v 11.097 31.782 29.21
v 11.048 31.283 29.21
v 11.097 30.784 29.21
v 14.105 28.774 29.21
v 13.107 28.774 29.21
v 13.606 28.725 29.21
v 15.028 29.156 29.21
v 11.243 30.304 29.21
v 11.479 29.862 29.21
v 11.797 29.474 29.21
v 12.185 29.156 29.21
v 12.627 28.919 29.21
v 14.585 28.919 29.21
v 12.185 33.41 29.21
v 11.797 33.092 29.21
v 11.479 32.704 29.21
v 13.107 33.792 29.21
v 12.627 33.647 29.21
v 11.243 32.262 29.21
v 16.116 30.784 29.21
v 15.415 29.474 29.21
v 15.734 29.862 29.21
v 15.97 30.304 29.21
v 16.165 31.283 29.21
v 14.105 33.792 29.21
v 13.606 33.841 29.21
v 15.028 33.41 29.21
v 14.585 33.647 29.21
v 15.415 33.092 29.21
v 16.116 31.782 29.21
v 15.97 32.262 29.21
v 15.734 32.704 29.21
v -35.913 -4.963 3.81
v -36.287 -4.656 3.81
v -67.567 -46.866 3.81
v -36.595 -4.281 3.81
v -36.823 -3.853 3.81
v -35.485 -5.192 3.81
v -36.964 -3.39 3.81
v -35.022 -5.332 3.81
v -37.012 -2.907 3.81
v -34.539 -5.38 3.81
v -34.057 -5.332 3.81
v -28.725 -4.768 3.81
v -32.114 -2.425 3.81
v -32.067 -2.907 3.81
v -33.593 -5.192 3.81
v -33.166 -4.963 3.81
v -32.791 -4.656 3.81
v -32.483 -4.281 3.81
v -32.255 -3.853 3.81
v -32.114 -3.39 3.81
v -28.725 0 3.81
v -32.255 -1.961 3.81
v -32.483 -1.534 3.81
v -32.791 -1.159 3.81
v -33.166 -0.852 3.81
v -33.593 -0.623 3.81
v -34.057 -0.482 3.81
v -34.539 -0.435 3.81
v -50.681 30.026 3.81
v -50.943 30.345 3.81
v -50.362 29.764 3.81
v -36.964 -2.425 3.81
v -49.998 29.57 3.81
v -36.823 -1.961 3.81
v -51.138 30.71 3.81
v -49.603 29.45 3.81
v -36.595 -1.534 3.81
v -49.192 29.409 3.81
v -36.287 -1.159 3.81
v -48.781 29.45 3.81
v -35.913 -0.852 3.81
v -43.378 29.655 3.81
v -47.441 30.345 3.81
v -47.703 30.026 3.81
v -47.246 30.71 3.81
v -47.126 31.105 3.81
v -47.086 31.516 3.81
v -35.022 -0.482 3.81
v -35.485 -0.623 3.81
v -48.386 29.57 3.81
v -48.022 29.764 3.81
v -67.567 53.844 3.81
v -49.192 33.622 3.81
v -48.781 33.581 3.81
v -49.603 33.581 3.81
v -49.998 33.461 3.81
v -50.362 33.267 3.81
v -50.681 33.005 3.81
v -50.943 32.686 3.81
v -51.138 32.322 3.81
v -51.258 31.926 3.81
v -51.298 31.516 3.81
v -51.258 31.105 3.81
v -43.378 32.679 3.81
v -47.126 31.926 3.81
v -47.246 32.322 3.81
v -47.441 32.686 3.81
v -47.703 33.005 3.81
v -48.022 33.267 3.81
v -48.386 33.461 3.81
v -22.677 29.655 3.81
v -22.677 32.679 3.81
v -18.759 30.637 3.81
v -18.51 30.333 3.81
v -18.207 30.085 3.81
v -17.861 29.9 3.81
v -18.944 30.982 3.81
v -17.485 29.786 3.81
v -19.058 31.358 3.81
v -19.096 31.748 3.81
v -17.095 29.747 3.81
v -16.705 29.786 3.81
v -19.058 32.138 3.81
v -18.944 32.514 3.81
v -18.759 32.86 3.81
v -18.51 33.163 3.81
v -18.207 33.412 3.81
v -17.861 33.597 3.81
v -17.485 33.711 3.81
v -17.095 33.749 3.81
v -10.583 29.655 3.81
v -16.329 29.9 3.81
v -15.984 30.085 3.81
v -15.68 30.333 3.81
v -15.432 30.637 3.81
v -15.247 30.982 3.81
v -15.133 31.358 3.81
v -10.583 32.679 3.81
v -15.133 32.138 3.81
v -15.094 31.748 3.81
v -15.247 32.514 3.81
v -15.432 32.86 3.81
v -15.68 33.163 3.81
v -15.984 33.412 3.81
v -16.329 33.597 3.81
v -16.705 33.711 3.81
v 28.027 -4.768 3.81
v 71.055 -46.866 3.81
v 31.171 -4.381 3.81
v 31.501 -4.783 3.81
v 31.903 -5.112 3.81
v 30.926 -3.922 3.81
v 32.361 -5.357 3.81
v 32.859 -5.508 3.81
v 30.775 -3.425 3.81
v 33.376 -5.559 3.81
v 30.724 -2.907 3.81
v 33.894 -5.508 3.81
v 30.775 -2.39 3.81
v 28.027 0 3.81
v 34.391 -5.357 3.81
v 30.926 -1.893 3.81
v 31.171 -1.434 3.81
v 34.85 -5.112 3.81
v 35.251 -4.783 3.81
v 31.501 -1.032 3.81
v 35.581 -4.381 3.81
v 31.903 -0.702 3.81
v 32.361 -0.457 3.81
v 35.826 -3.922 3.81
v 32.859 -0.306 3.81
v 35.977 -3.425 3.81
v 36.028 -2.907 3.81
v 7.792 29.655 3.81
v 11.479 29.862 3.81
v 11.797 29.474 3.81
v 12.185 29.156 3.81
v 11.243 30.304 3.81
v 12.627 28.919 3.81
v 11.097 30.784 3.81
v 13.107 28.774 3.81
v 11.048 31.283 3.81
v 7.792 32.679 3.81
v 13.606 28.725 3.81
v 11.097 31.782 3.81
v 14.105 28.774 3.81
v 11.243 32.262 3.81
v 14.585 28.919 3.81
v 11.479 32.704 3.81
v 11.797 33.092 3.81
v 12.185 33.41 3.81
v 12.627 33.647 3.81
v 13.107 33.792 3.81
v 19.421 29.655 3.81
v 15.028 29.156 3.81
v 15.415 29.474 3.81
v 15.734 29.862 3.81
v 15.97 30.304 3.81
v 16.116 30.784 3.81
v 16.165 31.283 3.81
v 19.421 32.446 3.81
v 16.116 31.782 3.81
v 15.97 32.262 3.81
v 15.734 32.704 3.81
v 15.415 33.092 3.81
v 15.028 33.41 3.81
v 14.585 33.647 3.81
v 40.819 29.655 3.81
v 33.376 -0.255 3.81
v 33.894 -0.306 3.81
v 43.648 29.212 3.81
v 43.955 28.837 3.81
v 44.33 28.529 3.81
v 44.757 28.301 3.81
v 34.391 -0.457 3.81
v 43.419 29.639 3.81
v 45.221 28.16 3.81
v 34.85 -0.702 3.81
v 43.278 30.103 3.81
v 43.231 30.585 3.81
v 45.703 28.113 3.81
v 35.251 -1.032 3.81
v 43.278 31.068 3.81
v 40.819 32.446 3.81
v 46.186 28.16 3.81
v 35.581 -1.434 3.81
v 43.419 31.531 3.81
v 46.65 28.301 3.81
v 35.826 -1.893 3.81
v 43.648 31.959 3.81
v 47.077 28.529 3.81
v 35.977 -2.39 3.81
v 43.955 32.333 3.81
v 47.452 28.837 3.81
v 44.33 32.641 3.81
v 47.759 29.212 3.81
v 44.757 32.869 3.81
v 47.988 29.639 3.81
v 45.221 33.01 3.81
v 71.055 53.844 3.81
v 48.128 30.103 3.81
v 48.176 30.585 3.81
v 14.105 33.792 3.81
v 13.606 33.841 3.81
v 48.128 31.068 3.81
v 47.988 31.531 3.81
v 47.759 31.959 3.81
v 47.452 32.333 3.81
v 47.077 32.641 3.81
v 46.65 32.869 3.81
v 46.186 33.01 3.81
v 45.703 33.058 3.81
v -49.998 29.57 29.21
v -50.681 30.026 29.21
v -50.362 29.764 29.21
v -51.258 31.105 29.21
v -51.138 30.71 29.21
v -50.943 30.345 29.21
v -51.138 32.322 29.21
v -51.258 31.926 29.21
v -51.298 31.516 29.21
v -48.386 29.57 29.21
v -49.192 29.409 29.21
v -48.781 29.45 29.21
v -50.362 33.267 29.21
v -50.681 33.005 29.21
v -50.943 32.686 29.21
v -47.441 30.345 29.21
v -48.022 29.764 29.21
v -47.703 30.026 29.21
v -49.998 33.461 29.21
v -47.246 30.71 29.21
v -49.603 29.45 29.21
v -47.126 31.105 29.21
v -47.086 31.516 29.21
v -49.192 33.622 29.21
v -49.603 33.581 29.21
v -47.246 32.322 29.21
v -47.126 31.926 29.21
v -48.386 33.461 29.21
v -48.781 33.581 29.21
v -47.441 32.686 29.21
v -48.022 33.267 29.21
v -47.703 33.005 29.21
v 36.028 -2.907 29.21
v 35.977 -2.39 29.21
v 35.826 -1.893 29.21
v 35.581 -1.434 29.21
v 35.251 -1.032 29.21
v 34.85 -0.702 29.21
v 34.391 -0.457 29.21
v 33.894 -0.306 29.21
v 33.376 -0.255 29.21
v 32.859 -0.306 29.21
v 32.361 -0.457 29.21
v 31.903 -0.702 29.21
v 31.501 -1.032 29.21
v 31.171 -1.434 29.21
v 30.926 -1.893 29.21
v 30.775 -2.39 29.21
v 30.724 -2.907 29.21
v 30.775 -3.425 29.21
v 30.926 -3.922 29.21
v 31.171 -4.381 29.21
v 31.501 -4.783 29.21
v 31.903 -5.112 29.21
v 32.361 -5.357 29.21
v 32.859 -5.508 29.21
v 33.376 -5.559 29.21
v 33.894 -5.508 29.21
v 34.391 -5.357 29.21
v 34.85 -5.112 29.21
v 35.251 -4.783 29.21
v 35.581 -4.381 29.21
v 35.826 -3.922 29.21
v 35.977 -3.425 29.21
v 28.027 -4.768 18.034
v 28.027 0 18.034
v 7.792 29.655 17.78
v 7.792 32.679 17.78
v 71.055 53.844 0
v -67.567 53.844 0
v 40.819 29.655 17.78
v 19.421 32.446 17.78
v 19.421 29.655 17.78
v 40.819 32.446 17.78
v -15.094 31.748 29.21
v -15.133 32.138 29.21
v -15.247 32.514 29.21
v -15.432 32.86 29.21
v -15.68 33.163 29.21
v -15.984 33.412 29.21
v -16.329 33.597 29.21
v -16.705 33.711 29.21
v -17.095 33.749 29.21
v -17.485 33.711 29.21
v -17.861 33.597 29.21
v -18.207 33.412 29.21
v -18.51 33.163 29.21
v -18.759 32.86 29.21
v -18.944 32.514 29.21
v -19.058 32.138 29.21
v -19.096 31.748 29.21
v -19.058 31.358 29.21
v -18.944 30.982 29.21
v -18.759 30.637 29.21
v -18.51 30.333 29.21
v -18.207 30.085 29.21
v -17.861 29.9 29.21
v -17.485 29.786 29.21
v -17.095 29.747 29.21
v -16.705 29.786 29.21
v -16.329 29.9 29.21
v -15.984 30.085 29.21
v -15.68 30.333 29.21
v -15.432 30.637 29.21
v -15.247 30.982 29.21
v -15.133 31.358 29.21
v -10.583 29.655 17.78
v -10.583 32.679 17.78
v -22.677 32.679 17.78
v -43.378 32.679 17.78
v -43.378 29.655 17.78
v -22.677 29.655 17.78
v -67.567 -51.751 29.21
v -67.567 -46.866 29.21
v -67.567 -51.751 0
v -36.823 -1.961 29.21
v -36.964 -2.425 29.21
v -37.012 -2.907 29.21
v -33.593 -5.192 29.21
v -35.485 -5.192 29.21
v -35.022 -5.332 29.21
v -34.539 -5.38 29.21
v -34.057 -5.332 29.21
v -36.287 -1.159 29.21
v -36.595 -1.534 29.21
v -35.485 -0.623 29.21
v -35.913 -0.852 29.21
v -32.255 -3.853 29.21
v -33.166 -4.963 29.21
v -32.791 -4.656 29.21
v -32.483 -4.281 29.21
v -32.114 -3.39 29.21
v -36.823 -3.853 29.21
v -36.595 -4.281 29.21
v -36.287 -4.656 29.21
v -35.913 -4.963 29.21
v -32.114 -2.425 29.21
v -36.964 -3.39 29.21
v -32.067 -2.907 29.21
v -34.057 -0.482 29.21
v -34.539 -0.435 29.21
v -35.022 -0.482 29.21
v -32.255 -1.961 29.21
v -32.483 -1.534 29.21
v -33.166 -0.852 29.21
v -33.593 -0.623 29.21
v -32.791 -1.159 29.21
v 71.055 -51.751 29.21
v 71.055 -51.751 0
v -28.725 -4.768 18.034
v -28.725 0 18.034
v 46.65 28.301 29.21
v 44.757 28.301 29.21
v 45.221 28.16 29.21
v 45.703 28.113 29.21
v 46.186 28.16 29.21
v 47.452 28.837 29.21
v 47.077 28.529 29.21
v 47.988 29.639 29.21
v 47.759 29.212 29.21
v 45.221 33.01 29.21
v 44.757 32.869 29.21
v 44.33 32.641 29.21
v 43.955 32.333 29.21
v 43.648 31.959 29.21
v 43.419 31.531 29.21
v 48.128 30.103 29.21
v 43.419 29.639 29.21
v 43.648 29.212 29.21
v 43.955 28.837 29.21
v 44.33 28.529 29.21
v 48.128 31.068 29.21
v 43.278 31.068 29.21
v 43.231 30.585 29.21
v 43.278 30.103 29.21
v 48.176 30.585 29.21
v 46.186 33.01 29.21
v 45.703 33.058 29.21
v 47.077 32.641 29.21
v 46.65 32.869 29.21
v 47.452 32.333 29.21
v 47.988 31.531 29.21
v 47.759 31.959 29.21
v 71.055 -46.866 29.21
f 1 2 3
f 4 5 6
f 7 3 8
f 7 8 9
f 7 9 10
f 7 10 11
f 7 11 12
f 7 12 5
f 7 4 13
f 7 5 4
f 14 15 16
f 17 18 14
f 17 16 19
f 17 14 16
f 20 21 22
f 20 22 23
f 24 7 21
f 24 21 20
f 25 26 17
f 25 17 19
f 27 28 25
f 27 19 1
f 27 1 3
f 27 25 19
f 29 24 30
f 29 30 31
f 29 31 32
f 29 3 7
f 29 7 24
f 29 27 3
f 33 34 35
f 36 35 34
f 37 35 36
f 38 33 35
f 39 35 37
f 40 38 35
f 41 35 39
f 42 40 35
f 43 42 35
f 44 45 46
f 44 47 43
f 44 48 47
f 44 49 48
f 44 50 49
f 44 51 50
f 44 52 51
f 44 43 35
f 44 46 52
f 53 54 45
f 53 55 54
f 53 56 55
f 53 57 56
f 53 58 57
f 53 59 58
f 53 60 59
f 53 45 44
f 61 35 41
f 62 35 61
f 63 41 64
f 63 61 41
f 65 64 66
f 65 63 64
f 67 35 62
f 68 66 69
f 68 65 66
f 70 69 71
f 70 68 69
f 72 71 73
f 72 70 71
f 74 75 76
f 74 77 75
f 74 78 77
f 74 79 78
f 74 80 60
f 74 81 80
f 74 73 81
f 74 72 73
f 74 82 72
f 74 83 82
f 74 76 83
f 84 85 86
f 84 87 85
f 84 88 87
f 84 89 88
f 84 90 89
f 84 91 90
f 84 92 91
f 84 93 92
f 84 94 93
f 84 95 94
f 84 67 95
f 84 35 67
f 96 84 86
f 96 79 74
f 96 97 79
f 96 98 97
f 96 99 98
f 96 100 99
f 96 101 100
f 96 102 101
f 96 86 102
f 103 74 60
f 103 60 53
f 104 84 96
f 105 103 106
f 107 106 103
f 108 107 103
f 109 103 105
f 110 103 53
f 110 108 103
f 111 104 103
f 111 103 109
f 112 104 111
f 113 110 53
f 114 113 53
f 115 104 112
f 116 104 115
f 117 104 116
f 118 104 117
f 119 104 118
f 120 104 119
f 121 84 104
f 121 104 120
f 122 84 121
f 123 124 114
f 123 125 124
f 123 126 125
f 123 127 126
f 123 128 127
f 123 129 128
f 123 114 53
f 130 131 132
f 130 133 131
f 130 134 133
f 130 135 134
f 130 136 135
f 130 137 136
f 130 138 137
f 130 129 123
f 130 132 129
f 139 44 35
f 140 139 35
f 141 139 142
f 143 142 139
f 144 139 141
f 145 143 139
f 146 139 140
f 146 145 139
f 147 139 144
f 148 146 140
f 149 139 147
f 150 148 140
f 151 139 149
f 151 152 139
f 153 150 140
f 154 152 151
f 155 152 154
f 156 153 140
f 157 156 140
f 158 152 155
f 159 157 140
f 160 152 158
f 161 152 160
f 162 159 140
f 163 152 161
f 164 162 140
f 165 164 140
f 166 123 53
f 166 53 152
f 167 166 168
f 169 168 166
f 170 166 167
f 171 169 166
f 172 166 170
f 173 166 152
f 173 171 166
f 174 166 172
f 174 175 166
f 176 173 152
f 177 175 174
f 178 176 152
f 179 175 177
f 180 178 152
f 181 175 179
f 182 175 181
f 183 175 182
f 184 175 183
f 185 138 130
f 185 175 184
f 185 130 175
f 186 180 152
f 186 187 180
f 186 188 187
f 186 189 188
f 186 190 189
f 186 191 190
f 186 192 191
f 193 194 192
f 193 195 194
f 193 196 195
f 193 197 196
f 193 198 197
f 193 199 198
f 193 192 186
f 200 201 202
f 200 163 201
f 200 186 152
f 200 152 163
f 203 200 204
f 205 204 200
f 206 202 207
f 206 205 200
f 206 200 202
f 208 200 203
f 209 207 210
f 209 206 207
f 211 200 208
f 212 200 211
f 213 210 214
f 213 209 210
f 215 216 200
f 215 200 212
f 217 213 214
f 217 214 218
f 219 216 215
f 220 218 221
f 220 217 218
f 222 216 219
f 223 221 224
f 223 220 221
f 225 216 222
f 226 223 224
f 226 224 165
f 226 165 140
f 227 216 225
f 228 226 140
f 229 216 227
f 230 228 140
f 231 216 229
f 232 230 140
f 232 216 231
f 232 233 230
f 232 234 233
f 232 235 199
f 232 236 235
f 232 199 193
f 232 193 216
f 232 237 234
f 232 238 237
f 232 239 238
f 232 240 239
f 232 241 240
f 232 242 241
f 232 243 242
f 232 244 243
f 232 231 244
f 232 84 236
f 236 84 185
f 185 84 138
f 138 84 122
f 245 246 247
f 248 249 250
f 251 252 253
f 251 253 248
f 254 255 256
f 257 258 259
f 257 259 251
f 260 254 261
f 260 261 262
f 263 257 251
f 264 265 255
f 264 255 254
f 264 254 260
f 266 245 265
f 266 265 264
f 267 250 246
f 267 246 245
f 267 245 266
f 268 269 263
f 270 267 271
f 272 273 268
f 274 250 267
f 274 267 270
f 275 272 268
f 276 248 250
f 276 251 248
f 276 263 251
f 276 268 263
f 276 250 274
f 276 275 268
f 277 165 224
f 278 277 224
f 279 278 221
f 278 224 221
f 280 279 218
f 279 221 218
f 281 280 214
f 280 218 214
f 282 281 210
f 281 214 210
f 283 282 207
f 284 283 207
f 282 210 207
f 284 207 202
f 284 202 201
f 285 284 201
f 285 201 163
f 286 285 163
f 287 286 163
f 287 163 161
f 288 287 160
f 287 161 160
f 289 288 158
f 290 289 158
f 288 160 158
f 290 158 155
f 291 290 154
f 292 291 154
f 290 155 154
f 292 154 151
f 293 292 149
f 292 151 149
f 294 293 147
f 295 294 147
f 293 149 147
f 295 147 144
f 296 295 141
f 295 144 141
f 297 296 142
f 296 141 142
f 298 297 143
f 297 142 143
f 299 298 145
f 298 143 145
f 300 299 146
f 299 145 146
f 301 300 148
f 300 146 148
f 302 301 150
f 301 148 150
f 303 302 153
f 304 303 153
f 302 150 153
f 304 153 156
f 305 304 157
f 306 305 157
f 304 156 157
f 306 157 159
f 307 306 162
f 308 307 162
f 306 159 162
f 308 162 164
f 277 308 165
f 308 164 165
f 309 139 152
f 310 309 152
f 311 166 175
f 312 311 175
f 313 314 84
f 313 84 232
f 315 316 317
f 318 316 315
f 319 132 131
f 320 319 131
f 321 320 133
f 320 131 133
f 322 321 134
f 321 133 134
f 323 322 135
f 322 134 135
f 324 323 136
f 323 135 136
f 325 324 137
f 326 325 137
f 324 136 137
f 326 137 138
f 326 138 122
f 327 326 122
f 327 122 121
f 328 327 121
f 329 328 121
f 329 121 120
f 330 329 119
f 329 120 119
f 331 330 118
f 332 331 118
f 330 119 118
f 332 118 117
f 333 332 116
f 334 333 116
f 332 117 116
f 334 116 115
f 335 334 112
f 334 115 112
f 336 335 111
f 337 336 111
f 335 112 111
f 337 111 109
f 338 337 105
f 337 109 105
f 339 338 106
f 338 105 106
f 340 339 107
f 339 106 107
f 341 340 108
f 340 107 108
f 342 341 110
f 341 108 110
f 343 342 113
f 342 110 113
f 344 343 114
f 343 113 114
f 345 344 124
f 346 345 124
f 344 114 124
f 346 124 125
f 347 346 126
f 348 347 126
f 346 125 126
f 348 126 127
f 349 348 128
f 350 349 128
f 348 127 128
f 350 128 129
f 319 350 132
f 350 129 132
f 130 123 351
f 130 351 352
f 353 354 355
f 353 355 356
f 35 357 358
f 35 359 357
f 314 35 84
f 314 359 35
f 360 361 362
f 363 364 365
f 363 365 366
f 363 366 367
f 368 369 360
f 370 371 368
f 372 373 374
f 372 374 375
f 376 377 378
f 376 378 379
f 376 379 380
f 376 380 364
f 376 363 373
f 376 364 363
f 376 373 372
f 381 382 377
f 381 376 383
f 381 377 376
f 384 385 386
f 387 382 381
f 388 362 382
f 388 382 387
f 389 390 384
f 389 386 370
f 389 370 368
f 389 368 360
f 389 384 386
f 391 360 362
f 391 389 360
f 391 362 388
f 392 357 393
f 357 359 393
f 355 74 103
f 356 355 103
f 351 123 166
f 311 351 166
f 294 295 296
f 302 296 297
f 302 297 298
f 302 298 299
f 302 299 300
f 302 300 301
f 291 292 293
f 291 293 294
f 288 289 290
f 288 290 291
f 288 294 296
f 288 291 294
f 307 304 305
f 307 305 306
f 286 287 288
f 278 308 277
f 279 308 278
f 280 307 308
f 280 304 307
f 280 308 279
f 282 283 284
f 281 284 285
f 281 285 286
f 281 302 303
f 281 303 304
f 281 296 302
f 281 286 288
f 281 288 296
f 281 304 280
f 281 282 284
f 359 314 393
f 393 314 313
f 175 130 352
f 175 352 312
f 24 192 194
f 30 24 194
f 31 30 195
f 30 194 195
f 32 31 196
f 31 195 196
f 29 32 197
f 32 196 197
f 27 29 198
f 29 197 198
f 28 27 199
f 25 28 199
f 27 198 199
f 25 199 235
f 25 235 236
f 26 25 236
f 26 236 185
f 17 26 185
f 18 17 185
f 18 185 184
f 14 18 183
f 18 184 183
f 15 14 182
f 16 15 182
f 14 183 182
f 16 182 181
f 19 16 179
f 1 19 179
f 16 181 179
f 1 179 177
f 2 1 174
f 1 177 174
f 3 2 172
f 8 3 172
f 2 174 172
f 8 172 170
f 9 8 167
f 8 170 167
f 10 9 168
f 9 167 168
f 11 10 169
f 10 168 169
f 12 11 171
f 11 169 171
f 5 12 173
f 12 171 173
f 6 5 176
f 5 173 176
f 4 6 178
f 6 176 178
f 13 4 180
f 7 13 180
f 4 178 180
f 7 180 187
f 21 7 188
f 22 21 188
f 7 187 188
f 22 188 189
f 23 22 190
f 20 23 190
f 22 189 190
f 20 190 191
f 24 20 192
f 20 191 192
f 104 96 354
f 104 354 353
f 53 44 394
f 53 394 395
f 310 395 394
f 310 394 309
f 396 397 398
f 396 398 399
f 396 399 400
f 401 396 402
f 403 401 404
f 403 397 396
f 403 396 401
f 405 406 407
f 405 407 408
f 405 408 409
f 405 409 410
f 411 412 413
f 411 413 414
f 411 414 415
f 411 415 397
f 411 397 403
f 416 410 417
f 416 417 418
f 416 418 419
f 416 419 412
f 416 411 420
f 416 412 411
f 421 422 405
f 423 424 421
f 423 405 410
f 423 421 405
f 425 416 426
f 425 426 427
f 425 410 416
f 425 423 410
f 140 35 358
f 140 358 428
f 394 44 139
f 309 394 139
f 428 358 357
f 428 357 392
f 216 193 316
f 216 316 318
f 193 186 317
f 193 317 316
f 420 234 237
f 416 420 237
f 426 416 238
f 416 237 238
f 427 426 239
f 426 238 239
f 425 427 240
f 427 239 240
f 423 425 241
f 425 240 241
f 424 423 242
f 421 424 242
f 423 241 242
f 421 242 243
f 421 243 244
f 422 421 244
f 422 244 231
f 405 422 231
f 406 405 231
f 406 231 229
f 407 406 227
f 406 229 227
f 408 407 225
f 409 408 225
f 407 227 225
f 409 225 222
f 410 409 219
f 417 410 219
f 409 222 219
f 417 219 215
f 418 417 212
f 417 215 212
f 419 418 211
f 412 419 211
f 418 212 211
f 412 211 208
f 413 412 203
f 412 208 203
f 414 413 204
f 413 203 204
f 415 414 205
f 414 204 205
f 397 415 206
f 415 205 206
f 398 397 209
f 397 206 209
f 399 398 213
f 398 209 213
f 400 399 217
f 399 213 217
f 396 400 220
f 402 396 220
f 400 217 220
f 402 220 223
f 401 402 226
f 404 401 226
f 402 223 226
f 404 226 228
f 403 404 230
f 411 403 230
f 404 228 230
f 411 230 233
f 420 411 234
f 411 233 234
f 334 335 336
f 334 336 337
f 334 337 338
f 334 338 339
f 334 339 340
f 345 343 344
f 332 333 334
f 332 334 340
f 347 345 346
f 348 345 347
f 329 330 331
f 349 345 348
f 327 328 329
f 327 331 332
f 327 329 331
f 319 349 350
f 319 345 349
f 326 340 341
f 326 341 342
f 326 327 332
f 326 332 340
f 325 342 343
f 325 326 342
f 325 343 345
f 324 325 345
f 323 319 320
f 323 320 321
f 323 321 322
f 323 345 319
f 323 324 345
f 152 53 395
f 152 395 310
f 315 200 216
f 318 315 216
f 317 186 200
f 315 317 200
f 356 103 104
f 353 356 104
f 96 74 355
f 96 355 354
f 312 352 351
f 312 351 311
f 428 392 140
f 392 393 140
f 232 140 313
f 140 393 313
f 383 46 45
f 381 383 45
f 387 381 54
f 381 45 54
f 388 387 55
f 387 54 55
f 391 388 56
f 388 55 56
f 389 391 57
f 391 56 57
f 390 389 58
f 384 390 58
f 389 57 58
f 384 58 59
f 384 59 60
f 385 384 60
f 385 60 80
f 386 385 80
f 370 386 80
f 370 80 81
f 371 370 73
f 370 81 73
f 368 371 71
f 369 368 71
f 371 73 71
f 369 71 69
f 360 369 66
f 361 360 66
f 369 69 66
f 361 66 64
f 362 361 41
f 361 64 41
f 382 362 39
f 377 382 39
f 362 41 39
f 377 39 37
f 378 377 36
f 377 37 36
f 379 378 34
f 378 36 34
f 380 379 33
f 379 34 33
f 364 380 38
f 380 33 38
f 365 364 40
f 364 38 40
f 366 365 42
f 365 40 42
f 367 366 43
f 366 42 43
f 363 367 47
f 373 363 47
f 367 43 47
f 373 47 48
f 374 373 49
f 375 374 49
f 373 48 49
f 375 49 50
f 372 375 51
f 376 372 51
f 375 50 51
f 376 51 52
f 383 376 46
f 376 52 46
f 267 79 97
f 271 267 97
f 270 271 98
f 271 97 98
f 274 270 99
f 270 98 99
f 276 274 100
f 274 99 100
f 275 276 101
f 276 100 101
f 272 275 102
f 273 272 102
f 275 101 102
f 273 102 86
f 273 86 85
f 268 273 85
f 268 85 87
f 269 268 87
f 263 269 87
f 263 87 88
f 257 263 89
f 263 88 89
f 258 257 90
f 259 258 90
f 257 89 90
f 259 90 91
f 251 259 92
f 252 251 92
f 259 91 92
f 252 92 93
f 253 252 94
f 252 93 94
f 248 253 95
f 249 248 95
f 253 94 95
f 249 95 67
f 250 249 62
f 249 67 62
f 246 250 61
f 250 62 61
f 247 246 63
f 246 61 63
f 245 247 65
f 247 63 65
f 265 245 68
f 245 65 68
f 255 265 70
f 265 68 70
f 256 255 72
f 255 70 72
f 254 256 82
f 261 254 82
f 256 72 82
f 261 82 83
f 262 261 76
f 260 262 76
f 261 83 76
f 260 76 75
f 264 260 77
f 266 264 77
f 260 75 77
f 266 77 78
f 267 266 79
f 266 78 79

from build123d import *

# Parameters (mm, degrees)
F0_W      = 138.621978
F0_H      = 105.59459
F1_DEPTH  = 3.81
F2_R      = 2.106167
F3_DEPTH  = 25.4
F4_R      = 2.000792
F5_DEPTH  = 25.4
F6_R      = 2.558459
F7_DEPTH  = 25.4
F8_R      = 2.472435
F9_DEPTH  = 25.4
F10_W     = 138.621978
F10_H     = 4.884328
F11_DEPTH = 25.4
F12_R     = 2.472435
F13_DEPTH = 25.4
F14_R     = 2.6519
F15_DEPTH = 25.4
F16_W     = 20.700261
F16_H     = 3.023634
F16_W_2   = 18.374391
F16_W_3   = 21.398022
F16_H_2   = 2.791049
F17_DEPTH = 13.97
F18_W     = 56.751281
F18_H     = 4.768038
F19_DEPTH = 14.224


with BuildPart() as f1:
    # F0 (on Top) → F1 (new body)
    with BuildSketch(Plane.XY):
        with Locations((1.744408, 1.046643)):
            Rectangle(F0_W, F0_H)
    extrude(amount=F1_DEPTH)

    # F2 (on face) → F3 (join)
    with BuildSketch(Plane.XY.offset(3.81)):
        with Locations((-49.192194, 31.515568)):
            Circle(F2_R)
    extrude(amount=F3_DEPTH)

    # F4 (on face) → F5 (join)
    with BuildSketch(Plane.XY.offset(3.81)):
        with Locations((-17.09516, 31.748157)):
            Circle(F4_R)
    extrude(amount=F5_DEPTH)

    # F6 (on face) → F7 (join)
    with BuildSketch(Plane.XY.offset(3.81)):
        with Locations((13.606353, 31.28298)):
            Circle(F6_R)
    extrude(amount=F7_DEPTH)

    # F8 (on face) → F9 (join)
    with BuildSketch(Plane.XY.offset(3.81)):
        with Locations((45.703389, 30.585218)):
            Circle(F8_R)
    extrude(amount=F9_DEPTH)

    # F10 (on face) → F11 (join)
    with BuildSketch(Plane.XY.offset(3.81)):
        with Locations((1.744408, -49.308488)):
            Rectangle(F10_W, F10_H)
    extrude(amount=F11_DEPTH)

    # F12 (on face) → F13 (join)
    with BuildSketch(Plane.XY.offset(3.81)):
        with Locations((-34.5392, -2.90734)):
            Circle(F12_R)
    extrude(amount=F13_DEPTH)

    # F14 (on face) → F15 (join)
    with BuildSketch(Plane.XY.offset(3.81)):
        with Locations((33.376262, -2.90734)):
            Circle(F14_R)
    extrude(amount=F15_DEPTH)

    # F16 (on face) → F17 (join)
    with BuildSketch(Plane.XY.offset(3.81)):
        with Locations((-33.027384, 31.166687)):
            Rectangle(F16_W, F16_H)
        with Locations((-1.395523, 31.166687)):
            Rectangle(F16_W_2, F16_H)
        with Locations((30.120045, 31.050394)):
            Rectangle(F16_W_3, F16_H_2)
    extrude(amount=F17_DEPTH)

    # F18 (on face) → F19 (join)
    with BuildSketch(Plane.XY.offset(3.81)):
        with Locations((-0.34888, -2.384019)):
            Rectangle(F18_W, F18_H)
    extrude(amount=F19_DEPTH)


solid = f1.part
